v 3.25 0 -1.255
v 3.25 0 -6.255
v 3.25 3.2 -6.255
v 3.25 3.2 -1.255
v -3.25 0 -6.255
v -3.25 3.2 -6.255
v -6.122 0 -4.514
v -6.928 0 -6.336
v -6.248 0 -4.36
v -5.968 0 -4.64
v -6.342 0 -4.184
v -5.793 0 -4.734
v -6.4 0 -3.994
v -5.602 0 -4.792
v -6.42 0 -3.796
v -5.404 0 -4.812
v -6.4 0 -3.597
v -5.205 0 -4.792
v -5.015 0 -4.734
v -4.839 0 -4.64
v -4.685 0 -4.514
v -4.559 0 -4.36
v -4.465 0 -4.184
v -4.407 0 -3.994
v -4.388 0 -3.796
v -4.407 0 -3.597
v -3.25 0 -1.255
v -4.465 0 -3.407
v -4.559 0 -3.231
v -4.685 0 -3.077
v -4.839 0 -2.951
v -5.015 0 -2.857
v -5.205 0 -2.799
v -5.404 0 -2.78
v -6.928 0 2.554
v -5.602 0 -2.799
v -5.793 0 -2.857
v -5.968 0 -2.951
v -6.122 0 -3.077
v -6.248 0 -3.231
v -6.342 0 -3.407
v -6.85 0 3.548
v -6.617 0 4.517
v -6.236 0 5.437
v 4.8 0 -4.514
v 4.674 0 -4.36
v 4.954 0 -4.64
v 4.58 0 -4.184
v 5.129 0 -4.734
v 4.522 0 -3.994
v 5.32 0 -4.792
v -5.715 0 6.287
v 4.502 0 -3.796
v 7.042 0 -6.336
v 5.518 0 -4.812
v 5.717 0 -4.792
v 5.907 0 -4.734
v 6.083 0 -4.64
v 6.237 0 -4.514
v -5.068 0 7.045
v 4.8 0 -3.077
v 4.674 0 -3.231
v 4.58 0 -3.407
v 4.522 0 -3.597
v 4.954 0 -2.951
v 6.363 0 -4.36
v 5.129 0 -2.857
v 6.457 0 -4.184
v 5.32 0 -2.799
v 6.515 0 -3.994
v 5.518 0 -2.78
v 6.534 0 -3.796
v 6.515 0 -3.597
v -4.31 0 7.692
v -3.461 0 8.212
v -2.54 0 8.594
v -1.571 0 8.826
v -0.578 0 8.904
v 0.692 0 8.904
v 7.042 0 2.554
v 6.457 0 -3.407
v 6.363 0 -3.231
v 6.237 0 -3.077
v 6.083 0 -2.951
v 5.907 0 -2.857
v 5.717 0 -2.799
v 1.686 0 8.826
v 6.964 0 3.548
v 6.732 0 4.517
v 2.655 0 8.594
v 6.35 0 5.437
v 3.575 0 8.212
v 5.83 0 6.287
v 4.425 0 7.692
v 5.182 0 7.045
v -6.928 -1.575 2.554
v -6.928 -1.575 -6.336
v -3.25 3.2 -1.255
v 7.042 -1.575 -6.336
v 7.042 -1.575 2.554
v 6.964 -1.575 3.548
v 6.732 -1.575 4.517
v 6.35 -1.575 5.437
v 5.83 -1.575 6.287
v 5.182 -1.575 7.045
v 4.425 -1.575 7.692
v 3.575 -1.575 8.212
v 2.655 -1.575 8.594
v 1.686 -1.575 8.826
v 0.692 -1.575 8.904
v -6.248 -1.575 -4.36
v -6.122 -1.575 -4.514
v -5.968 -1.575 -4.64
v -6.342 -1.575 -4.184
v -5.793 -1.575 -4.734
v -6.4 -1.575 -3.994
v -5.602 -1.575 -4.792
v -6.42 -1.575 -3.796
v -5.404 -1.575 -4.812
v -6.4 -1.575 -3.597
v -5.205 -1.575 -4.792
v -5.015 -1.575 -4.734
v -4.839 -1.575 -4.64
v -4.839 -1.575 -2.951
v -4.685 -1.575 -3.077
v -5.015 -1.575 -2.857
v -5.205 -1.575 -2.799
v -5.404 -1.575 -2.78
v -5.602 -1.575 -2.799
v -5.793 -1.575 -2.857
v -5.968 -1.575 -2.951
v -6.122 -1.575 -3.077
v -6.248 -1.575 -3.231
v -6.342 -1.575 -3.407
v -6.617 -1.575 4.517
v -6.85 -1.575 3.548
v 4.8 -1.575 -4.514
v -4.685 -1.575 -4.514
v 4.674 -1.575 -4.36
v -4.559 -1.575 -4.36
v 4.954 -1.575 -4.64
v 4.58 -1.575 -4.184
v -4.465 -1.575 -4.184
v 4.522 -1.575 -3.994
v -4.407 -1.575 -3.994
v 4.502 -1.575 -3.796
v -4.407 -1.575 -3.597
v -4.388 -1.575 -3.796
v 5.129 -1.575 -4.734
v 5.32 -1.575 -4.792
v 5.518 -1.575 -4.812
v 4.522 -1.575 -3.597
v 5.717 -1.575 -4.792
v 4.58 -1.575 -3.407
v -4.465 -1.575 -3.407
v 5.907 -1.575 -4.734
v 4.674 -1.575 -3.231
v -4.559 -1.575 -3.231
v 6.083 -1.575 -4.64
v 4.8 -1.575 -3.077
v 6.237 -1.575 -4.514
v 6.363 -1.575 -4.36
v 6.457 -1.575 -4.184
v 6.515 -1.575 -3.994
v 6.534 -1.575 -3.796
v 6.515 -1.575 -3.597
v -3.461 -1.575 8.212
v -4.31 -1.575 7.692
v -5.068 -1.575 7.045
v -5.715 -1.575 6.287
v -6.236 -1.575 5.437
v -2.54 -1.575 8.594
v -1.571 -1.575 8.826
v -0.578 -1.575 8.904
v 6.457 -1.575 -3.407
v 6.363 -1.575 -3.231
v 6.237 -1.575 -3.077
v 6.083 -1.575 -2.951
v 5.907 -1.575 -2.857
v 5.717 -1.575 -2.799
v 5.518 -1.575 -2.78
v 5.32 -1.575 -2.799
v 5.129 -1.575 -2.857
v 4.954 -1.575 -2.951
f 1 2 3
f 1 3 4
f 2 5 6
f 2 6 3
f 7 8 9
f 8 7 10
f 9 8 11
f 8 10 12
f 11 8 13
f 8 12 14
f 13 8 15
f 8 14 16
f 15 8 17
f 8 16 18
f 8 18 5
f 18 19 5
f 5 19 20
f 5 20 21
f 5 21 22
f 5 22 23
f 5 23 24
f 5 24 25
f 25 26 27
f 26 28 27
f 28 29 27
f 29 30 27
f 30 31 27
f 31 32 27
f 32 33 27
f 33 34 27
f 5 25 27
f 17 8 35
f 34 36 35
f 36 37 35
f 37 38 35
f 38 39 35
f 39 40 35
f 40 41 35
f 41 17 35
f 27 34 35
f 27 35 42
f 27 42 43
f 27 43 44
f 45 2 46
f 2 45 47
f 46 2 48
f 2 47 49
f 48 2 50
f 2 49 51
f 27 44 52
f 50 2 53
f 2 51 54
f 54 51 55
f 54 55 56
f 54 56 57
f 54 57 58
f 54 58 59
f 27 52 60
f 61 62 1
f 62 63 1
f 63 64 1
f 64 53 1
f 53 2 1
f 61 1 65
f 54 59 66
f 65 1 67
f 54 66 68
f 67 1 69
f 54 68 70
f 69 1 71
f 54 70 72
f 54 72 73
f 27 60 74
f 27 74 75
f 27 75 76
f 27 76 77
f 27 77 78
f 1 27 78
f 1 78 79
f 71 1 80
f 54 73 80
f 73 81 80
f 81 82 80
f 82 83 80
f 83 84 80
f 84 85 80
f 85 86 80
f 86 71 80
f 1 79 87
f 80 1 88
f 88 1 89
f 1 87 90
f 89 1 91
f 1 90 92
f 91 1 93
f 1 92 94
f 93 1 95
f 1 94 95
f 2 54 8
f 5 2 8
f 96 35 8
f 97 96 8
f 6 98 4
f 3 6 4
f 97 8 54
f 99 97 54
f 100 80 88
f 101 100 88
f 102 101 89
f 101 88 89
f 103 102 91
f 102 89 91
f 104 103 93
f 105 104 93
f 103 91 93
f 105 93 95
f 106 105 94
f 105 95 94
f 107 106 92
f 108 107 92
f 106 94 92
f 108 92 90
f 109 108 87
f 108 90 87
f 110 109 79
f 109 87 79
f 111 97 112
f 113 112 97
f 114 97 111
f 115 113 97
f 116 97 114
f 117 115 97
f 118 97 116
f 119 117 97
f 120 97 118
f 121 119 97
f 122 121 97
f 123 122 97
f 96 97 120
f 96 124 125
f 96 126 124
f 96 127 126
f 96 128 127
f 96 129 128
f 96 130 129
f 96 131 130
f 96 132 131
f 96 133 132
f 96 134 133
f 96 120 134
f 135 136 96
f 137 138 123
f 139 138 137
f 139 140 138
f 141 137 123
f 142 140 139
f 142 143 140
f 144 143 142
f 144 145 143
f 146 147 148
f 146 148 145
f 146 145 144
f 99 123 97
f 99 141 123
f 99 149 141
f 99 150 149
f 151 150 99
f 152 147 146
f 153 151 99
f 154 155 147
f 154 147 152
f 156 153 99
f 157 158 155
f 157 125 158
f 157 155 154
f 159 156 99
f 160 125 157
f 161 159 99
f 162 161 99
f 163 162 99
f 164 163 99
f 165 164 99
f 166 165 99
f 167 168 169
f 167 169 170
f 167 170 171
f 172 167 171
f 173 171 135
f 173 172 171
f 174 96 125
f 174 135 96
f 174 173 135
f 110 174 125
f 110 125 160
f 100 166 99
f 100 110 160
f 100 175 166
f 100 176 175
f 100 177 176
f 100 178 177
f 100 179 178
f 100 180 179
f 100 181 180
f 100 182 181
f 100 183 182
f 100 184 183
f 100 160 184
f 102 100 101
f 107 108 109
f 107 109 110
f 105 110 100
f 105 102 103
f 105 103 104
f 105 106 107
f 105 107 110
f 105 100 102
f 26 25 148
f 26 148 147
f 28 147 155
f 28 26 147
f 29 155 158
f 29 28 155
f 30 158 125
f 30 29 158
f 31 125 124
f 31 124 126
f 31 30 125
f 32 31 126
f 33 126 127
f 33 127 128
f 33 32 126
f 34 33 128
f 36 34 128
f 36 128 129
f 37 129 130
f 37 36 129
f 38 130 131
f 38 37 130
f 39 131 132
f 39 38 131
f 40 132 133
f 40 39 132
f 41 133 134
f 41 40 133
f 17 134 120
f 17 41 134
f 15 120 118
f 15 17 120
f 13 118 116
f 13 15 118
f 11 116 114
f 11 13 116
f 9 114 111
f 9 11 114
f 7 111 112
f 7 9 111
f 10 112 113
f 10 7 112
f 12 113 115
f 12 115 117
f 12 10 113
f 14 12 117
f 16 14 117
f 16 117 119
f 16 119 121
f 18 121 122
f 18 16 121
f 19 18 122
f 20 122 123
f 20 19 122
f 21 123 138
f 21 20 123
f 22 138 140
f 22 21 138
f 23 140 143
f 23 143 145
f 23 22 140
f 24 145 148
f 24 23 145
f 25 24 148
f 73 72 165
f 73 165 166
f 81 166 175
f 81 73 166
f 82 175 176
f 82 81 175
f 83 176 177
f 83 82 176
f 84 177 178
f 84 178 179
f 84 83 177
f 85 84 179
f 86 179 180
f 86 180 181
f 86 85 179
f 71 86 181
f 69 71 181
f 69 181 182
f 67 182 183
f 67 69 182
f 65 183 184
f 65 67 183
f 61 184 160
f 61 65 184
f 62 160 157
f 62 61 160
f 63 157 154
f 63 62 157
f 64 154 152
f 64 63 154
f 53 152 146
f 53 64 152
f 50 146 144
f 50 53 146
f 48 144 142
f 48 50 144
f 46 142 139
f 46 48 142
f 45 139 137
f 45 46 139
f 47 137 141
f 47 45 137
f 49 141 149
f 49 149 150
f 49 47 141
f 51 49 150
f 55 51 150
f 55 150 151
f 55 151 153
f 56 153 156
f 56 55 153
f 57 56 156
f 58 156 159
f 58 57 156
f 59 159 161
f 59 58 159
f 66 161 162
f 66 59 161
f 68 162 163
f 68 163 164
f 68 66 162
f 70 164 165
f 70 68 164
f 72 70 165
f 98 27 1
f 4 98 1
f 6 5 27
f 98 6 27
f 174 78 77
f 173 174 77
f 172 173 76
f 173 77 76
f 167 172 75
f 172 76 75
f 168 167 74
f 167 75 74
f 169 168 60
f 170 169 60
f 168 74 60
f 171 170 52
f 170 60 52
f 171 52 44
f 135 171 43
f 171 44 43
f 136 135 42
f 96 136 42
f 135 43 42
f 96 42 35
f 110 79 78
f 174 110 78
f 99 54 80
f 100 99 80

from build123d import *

# Parameters (mm, degrees)
F0_R     = 1.016
F1_DEPTH = 1.5748
F2_W     = 6.5
F2_H     = 5
F3_DEPTH = 3.2


with BuildPart() as f1:
    # F0 (on Front) → F1 (new body)
    with BuildSketch(Plane.XZ):
        with BuildLine():
            Line((0.692302, 8.904484), (-0.577698, 8.904484))
            ThreePointArc((-0.577698, 8.904484), (-5.067826, 7.044612), (-6.927698, 2.554484))
            Line((-6.927698, 2.554484), (-6.927698, -6.335516))
            Line((-6.927698, -6.335516), (7.042302, -6.335516))
            Line((7.042302, -6.335516), (7.042302, 2.554484))
            ThreePointArc((7.042302, 2.554484), (5.18243, 7.044612), (0.692302, 8.904484))
        make_face()
        with Locations((-5.403698, -3.795516)):
            Circle(F0_R, mode=Mode.SUBTRACT)
        with Locations((5.518302, -3.795516)):
            Circle(F0_R, mode=Mode.SUBTRACT)
    extrude(amount=F1_DEPTH)

    # F2 (on face) → F3 (join)
    with BuildSketch(Plane.XZ):
        with Locations((0, -3.755355)):
            Rectangle(F2_W, F2_H)
    extrude(amount=-F3_DEPTH)


solid = f1.part
